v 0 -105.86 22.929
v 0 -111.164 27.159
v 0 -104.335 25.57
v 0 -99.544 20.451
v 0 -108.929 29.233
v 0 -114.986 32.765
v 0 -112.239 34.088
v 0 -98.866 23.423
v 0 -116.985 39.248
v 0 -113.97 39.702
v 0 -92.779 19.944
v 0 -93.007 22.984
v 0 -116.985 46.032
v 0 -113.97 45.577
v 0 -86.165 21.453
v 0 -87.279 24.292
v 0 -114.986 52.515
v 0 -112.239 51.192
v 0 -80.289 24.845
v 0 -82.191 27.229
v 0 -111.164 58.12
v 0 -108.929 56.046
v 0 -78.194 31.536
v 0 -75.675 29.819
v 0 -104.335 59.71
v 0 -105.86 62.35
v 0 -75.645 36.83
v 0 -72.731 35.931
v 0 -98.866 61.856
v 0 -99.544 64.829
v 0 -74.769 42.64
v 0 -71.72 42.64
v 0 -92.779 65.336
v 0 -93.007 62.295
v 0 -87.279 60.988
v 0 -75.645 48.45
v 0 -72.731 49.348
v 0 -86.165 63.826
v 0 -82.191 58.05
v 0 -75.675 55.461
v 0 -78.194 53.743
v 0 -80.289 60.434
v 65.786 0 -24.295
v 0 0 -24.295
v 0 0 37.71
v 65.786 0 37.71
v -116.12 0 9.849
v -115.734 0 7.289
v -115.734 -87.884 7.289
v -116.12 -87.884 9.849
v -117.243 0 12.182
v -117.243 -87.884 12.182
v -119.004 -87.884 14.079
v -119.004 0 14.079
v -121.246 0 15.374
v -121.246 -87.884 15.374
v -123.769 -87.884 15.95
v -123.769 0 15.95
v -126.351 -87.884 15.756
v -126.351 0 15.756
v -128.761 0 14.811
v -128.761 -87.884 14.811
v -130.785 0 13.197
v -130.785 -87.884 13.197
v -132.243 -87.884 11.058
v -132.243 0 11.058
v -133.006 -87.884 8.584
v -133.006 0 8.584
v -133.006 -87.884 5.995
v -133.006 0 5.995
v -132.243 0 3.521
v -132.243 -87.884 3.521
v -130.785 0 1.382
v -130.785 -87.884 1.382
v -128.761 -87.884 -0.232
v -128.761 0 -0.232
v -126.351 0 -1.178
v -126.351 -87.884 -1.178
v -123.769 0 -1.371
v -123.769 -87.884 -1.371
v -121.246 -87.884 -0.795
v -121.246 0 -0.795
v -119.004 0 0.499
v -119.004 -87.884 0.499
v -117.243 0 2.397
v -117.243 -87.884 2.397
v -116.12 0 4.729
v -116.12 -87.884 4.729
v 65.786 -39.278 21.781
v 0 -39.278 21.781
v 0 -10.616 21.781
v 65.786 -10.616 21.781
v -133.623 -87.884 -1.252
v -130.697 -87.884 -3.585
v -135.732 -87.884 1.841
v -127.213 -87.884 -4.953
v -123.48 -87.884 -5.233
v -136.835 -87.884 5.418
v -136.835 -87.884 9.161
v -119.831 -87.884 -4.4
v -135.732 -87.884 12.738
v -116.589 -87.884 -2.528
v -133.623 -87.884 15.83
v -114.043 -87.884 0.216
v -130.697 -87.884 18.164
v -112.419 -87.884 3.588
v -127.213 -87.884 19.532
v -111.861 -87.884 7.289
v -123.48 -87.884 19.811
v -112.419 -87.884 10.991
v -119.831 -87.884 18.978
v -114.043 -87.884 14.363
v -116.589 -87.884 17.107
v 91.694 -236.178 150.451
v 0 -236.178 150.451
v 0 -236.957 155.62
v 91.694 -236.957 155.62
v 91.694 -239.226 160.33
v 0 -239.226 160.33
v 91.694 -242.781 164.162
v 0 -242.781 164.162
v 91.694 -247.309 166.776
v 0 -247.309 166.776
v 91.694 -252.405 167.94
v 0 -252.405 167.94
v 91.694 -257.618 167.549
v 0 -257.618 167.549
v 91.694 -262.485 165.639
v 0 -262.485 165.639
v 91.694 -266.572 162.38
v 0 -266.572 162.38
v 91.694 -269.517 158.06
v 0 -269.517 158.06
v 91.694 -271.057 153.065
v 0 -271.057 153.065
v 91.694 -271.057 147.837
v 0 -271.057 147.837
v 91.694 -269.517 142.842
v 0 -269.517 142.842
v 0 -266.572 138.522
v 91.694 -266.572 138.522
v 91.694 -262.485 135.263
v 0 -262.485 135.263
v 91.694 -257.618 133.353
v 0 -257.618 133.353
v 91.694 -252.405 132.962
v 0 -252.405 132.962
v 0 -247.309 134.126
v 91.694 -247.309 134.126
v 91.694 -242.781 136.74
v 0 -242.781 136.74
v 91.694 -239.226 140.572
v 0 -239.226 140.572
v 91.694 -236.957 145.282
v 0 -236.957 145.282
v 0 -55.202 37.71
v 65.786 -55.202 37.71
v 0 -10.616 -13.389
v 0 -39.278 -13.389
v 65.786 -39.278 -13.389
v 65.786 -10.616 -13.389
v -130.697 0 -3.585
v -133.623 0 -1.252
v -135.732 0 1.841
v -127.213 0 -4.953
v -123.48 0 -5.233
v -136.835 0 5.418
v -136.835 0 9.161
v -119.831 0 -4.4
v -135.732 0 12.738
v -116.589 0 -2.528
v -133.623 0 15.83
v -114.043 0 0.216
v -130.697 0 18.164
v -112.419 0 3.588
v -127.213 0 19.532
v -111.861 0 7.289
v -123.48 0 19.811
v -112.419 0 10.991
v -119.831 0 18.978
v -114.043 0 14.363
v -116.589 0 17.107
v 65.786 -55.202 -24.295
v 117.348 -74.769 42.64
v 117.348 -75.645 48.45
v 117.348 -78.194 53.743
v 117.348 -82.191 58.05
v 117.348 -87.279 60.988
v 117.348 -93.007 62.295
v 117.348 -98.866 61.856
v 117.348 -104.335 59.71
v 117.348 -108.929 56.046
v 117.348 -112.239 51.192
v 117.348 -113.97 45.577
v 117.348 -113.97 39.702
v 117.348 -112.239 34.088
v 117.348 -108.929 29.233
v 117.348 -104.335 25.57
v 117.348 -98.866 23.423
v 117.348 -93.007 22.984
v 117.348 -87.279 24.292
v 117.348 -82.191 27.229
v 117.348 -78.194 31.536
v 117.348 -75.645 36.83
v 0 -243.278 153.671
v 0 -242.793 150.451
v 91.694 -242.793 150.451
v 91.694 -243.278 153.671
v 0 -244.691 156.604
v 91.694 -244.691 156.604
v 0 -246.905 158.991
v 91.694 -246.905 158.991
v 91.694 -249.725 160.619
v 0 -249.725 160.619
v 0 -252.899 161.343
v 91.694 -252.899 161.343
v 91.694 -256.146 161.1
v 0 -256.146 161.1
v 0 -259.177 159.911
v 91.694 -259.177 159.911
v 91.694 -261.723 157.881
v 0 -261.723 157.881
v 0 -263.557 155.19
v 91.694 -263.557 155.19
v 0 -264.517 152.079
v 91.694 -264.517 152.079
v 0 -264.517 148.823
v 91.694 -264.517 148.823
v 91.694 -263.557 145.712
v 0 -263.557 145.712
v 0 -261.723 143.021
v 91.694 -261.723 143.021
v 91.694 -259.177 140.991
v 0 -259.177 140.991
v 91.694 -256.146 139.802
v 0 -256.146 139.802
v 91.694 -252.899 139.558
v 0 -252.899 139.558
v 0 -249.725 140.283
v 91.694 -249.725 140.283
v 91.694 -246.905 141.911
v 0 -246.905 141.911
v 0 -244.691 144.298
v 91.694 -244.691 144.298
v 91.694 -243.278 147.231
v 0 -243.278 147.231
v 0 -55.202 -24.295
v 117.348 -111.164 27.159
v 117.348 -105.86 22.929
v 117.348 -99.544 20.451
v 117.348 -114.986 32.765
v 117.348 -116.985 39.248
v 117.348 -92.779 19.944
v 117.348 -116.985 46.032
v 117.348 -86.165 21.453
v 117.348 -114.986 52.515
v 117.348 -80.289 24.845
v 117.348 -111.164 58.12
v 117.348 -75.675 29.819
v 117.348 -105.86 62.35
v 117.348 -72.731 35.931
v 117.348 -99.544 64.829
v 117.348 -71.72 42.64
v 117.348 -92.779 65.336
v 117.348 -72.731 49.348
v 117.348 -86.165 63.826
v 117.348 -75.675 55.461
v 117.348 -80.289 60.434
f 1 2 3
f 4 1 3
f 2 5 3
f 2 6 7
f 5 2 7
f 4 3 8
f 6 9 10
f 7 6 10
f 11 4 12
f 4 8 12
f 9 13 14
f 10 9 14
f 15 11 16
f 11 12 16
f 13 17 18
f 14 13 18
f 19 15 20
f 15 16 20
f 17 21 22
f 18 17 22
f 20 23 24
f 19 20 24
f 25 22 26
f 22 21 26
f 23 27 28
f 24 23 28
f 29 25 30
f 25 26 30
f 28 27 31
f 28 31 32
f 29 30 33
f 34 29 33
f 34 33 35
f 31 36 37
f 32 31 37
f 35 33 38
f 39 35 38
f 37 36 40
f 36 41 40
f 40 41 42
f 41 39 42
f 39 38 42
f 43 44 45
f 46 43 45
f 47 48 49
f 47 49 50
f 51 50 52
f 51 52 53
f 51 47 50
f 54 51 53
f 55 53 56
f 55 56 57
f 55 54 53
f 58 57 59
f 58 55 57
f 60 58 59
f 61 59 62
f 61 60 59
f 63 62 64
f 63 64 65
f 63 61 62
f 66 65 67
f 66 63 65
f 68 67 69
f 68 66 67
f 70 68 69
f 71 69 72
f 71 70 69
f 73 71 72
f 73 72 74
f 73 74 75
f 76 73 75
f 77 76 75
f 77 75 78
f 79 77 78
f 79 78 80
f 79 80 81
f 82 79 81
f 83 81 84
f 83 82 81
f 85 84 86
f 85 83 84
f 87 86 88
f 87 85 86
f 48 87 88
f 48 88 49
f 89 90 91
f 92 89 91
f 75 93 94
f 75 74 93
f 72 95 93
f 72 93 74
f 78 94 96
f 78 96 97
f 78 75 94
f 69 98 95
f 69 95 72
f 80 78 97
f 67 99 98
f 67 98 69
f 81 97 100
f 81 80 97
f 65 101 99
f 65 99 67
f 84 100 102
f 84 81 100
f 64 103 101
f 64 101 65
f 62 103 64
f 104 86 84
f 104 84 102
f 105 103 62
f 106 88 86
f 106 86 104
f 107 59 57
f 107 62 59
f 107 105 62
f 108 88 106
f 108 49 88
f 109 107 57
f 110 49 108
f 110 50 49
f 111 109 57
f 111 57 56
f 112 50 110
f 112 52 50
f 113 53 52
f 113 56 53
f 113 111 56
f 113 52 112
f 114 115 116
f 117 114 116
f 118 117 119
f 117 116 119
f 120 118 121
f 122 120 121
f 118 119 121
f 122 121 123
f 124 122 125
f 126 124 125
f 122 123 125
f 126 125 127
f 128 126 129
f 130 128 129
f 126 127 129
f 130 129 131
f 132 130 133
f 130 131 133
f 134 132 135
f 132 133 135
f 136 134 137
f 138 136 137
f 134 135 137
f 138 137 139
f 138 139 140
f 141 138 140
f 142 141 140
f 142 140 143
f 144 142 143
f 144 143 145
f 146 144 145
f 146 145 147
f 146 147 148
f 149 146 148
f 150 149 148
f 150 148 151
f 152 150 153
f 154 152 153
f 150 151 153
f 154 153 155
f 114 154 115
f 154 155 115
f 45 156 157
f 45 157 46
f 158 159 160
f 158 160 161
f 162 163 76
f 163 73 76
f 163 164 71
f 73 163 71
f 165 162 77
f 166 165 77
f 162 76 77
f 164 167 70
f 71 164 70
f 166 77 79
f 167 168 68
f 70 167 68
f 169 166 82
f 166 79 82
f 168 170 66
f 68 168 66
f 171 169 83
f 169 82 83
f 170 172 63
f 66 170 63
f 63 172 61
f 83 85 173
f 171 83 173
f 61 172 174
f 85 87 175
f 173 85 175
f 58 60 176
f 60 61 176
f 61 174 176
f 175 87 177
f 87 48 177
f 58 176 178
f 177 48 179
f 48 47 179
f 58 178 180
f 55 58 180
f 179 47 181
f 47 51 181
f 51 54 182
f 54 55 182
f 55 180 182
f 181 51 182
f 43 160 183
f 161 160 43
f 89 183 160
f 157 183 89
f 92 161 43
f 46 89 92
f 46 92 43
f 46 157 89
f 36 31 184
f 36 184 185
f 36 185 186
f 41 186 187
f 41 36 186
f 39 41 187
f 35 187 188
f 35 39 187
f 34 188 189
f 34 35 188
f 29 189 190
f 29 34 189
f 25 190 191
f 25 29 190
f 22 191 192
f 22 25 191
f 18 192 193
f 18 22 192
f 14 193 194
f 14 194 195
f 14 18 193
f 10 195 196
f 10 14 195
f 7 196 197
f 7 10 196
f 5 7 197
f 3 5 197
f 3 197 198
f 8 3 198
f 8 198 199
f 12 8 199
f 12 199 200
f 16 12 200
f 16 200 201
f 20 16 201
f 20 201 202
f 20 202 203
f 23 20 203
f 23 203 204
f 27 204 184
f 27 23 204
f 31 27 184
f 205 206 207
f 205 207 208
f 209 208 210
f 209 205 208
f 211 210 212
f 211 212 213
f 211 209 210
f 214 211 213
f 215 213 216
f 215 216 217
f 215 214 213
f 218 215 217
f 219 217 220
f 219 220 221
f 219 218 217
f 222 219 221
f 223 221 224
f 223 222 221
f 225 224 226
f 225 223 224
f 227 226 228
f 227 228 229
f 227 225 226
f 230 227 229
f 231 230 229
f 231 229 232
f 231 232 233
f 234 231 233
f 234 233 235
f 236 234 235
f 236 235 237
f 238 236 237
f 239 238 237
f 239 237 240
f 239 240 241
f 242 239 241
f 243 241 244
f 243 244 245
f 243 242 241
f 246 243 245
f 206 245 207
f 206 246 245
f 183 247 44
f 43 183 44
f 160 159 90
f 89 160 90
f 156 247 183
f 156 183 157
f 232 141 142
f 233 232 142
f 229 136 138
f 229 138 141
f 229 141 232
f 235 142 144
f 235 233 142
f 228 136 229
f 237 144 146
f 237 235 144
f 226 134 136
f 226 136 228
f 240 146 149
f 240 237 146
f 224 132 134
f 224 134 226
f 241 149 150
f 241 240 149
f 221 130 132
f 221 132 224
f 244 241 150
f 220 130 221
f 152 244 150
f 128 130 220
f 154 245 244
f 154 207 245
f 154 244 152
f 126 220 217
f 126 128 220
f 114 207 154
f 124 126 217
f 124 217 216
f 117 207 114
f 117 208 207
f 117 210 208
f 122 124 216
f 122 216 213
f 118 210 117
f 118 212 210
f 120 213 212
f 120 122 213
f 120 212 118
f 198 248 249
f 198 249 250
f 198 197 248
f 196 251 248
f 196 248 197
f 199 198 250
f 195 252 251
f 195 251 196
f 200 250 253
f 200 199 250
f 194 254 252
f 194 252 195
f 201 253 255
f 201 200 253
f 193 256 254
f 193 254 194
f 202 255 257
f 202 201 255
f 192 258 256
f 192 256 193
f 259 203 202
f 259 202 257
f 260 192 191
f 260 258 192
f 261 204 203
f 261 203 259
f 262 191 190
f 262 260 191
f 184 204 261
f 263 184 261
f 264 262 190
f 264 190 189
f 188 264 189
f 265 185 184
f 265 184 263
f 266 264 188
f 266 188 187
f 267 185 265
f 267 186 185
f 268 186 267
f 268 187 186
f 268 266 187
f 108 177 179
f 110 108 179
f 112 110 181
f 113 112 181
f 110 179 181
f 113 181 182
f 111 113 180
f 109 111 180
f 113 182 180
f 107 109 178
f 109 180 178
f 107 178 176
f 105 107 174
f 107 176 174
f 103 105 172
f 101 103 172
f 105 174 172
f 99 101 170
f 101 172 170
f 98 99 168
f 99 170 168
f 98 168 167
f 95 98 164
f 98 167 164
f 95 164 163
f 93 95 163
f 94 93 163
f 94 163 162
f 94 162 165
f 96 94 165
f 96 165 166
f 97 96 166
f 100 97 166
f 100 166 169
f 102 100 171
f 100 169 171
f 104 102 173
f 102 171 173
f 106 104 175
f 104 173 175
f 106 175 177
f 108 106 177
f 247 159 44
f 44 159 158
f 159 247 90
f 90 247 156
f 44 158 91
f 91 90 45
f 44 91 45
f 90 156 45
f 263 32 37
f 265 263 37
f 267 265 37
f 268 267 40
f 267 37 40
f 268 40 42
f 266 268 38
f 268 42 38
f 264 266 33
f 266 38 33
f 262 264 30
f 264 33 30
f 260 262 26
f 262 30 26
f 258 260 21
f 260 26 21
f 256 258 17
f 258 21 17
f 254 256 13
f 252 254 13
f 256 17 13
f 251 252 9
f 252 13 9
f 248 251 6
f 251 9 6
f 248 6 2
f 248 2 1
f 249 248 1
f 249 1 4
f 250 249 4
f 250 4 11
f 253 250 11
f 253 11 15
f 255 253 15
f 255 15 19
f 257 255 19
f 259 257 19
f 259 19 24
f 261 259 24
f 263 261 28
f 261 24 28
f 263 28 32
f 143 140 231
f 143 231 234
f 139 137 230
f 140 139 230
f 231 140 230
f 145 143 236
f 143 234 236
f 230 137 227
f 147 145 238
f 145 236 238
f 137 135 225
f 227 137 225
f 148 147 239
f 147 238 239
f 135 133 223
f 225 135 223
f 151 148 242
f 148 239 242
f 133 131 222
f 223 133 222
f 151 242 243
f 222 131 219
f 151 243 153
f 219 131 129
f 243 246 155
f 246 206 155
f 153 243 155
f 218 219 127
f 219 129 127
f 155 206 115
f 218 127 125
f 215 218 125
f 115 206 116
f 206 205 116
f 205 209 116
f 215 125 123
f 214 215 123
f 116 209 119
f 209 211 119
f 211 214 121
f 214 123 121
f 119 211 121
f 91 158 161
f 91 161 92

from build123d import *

# Parameters (mm, degrees)
F0_R     = 12.557076
F0_R_2   = 8.684803
F1_DEPTH = 87.884
F2_R     = 17.537601
F2_R_2   = 10.923049
F3_DEPTH = 91.694
F4_R     = 22.759749
F4_R_2   = 19.710562
F5_DEPTH = 117.348
F6_W     = 55.20175
F6_H     = 62.005337
F6_W_2   = 28.662441
F6_H_2   = 35.169784
F7_DEPTH = 65.786


with BuildPart() as f1:
    # F0 (on Front) → F1 (new body)
    with BuildSketch(Plane.XZ):
        with Locations((-124.41849, 7.28937)):
            Circle(F0_R)
        with Locations((-124.41849, 7.28937)):
            Circle(F0_R_2, mode=Mode.SUBTRACT)
    extrude(amount=F1_DEPTH)


with BuildPart() as f3:
    # F2 (on Right) → F3 (new body)
    with BuildSketch(Plane.YZ):
        with Locations((-253.715754, 150.45099)):
            Circle(F2_R)
        with Locations((-253.715754, 150.45099)):
            Circle(F2_R_2, mode=Mode.SUBTRACT)
    extrude(amount=F3_DEPTH)


with BuildPart() as f5:
    # F4 (on Right) → F5 (new body)
    with BuildSketch(Plane.YZ):
        with Locations((-94.479904, 42.639732)):
            Circle(F4_R)
        with Locations((-94.479904, 42.639732)):
            Circle(F4_R_2, mode=Mode.SUBTRACT)
    extrude(amount=F5_DEPTH)


with BuildPart() as f7:
    # F6 (on Right) → F7 (new body)
    with BuildSketch(Plane.YZ):
        with Locations((-27.600875, 6.707558)):
            Rectangle(F6_W, F6_H)
        with Locations((-24.946951, 4.195858)):
            Rectangle(F6_W_2, F6_H_2, mode=Mode.SUBTRACT)
    extrude(amount=F7_DEPTH)


solid = Compound([f1.part, f3.part, f5.part, f7.part])
